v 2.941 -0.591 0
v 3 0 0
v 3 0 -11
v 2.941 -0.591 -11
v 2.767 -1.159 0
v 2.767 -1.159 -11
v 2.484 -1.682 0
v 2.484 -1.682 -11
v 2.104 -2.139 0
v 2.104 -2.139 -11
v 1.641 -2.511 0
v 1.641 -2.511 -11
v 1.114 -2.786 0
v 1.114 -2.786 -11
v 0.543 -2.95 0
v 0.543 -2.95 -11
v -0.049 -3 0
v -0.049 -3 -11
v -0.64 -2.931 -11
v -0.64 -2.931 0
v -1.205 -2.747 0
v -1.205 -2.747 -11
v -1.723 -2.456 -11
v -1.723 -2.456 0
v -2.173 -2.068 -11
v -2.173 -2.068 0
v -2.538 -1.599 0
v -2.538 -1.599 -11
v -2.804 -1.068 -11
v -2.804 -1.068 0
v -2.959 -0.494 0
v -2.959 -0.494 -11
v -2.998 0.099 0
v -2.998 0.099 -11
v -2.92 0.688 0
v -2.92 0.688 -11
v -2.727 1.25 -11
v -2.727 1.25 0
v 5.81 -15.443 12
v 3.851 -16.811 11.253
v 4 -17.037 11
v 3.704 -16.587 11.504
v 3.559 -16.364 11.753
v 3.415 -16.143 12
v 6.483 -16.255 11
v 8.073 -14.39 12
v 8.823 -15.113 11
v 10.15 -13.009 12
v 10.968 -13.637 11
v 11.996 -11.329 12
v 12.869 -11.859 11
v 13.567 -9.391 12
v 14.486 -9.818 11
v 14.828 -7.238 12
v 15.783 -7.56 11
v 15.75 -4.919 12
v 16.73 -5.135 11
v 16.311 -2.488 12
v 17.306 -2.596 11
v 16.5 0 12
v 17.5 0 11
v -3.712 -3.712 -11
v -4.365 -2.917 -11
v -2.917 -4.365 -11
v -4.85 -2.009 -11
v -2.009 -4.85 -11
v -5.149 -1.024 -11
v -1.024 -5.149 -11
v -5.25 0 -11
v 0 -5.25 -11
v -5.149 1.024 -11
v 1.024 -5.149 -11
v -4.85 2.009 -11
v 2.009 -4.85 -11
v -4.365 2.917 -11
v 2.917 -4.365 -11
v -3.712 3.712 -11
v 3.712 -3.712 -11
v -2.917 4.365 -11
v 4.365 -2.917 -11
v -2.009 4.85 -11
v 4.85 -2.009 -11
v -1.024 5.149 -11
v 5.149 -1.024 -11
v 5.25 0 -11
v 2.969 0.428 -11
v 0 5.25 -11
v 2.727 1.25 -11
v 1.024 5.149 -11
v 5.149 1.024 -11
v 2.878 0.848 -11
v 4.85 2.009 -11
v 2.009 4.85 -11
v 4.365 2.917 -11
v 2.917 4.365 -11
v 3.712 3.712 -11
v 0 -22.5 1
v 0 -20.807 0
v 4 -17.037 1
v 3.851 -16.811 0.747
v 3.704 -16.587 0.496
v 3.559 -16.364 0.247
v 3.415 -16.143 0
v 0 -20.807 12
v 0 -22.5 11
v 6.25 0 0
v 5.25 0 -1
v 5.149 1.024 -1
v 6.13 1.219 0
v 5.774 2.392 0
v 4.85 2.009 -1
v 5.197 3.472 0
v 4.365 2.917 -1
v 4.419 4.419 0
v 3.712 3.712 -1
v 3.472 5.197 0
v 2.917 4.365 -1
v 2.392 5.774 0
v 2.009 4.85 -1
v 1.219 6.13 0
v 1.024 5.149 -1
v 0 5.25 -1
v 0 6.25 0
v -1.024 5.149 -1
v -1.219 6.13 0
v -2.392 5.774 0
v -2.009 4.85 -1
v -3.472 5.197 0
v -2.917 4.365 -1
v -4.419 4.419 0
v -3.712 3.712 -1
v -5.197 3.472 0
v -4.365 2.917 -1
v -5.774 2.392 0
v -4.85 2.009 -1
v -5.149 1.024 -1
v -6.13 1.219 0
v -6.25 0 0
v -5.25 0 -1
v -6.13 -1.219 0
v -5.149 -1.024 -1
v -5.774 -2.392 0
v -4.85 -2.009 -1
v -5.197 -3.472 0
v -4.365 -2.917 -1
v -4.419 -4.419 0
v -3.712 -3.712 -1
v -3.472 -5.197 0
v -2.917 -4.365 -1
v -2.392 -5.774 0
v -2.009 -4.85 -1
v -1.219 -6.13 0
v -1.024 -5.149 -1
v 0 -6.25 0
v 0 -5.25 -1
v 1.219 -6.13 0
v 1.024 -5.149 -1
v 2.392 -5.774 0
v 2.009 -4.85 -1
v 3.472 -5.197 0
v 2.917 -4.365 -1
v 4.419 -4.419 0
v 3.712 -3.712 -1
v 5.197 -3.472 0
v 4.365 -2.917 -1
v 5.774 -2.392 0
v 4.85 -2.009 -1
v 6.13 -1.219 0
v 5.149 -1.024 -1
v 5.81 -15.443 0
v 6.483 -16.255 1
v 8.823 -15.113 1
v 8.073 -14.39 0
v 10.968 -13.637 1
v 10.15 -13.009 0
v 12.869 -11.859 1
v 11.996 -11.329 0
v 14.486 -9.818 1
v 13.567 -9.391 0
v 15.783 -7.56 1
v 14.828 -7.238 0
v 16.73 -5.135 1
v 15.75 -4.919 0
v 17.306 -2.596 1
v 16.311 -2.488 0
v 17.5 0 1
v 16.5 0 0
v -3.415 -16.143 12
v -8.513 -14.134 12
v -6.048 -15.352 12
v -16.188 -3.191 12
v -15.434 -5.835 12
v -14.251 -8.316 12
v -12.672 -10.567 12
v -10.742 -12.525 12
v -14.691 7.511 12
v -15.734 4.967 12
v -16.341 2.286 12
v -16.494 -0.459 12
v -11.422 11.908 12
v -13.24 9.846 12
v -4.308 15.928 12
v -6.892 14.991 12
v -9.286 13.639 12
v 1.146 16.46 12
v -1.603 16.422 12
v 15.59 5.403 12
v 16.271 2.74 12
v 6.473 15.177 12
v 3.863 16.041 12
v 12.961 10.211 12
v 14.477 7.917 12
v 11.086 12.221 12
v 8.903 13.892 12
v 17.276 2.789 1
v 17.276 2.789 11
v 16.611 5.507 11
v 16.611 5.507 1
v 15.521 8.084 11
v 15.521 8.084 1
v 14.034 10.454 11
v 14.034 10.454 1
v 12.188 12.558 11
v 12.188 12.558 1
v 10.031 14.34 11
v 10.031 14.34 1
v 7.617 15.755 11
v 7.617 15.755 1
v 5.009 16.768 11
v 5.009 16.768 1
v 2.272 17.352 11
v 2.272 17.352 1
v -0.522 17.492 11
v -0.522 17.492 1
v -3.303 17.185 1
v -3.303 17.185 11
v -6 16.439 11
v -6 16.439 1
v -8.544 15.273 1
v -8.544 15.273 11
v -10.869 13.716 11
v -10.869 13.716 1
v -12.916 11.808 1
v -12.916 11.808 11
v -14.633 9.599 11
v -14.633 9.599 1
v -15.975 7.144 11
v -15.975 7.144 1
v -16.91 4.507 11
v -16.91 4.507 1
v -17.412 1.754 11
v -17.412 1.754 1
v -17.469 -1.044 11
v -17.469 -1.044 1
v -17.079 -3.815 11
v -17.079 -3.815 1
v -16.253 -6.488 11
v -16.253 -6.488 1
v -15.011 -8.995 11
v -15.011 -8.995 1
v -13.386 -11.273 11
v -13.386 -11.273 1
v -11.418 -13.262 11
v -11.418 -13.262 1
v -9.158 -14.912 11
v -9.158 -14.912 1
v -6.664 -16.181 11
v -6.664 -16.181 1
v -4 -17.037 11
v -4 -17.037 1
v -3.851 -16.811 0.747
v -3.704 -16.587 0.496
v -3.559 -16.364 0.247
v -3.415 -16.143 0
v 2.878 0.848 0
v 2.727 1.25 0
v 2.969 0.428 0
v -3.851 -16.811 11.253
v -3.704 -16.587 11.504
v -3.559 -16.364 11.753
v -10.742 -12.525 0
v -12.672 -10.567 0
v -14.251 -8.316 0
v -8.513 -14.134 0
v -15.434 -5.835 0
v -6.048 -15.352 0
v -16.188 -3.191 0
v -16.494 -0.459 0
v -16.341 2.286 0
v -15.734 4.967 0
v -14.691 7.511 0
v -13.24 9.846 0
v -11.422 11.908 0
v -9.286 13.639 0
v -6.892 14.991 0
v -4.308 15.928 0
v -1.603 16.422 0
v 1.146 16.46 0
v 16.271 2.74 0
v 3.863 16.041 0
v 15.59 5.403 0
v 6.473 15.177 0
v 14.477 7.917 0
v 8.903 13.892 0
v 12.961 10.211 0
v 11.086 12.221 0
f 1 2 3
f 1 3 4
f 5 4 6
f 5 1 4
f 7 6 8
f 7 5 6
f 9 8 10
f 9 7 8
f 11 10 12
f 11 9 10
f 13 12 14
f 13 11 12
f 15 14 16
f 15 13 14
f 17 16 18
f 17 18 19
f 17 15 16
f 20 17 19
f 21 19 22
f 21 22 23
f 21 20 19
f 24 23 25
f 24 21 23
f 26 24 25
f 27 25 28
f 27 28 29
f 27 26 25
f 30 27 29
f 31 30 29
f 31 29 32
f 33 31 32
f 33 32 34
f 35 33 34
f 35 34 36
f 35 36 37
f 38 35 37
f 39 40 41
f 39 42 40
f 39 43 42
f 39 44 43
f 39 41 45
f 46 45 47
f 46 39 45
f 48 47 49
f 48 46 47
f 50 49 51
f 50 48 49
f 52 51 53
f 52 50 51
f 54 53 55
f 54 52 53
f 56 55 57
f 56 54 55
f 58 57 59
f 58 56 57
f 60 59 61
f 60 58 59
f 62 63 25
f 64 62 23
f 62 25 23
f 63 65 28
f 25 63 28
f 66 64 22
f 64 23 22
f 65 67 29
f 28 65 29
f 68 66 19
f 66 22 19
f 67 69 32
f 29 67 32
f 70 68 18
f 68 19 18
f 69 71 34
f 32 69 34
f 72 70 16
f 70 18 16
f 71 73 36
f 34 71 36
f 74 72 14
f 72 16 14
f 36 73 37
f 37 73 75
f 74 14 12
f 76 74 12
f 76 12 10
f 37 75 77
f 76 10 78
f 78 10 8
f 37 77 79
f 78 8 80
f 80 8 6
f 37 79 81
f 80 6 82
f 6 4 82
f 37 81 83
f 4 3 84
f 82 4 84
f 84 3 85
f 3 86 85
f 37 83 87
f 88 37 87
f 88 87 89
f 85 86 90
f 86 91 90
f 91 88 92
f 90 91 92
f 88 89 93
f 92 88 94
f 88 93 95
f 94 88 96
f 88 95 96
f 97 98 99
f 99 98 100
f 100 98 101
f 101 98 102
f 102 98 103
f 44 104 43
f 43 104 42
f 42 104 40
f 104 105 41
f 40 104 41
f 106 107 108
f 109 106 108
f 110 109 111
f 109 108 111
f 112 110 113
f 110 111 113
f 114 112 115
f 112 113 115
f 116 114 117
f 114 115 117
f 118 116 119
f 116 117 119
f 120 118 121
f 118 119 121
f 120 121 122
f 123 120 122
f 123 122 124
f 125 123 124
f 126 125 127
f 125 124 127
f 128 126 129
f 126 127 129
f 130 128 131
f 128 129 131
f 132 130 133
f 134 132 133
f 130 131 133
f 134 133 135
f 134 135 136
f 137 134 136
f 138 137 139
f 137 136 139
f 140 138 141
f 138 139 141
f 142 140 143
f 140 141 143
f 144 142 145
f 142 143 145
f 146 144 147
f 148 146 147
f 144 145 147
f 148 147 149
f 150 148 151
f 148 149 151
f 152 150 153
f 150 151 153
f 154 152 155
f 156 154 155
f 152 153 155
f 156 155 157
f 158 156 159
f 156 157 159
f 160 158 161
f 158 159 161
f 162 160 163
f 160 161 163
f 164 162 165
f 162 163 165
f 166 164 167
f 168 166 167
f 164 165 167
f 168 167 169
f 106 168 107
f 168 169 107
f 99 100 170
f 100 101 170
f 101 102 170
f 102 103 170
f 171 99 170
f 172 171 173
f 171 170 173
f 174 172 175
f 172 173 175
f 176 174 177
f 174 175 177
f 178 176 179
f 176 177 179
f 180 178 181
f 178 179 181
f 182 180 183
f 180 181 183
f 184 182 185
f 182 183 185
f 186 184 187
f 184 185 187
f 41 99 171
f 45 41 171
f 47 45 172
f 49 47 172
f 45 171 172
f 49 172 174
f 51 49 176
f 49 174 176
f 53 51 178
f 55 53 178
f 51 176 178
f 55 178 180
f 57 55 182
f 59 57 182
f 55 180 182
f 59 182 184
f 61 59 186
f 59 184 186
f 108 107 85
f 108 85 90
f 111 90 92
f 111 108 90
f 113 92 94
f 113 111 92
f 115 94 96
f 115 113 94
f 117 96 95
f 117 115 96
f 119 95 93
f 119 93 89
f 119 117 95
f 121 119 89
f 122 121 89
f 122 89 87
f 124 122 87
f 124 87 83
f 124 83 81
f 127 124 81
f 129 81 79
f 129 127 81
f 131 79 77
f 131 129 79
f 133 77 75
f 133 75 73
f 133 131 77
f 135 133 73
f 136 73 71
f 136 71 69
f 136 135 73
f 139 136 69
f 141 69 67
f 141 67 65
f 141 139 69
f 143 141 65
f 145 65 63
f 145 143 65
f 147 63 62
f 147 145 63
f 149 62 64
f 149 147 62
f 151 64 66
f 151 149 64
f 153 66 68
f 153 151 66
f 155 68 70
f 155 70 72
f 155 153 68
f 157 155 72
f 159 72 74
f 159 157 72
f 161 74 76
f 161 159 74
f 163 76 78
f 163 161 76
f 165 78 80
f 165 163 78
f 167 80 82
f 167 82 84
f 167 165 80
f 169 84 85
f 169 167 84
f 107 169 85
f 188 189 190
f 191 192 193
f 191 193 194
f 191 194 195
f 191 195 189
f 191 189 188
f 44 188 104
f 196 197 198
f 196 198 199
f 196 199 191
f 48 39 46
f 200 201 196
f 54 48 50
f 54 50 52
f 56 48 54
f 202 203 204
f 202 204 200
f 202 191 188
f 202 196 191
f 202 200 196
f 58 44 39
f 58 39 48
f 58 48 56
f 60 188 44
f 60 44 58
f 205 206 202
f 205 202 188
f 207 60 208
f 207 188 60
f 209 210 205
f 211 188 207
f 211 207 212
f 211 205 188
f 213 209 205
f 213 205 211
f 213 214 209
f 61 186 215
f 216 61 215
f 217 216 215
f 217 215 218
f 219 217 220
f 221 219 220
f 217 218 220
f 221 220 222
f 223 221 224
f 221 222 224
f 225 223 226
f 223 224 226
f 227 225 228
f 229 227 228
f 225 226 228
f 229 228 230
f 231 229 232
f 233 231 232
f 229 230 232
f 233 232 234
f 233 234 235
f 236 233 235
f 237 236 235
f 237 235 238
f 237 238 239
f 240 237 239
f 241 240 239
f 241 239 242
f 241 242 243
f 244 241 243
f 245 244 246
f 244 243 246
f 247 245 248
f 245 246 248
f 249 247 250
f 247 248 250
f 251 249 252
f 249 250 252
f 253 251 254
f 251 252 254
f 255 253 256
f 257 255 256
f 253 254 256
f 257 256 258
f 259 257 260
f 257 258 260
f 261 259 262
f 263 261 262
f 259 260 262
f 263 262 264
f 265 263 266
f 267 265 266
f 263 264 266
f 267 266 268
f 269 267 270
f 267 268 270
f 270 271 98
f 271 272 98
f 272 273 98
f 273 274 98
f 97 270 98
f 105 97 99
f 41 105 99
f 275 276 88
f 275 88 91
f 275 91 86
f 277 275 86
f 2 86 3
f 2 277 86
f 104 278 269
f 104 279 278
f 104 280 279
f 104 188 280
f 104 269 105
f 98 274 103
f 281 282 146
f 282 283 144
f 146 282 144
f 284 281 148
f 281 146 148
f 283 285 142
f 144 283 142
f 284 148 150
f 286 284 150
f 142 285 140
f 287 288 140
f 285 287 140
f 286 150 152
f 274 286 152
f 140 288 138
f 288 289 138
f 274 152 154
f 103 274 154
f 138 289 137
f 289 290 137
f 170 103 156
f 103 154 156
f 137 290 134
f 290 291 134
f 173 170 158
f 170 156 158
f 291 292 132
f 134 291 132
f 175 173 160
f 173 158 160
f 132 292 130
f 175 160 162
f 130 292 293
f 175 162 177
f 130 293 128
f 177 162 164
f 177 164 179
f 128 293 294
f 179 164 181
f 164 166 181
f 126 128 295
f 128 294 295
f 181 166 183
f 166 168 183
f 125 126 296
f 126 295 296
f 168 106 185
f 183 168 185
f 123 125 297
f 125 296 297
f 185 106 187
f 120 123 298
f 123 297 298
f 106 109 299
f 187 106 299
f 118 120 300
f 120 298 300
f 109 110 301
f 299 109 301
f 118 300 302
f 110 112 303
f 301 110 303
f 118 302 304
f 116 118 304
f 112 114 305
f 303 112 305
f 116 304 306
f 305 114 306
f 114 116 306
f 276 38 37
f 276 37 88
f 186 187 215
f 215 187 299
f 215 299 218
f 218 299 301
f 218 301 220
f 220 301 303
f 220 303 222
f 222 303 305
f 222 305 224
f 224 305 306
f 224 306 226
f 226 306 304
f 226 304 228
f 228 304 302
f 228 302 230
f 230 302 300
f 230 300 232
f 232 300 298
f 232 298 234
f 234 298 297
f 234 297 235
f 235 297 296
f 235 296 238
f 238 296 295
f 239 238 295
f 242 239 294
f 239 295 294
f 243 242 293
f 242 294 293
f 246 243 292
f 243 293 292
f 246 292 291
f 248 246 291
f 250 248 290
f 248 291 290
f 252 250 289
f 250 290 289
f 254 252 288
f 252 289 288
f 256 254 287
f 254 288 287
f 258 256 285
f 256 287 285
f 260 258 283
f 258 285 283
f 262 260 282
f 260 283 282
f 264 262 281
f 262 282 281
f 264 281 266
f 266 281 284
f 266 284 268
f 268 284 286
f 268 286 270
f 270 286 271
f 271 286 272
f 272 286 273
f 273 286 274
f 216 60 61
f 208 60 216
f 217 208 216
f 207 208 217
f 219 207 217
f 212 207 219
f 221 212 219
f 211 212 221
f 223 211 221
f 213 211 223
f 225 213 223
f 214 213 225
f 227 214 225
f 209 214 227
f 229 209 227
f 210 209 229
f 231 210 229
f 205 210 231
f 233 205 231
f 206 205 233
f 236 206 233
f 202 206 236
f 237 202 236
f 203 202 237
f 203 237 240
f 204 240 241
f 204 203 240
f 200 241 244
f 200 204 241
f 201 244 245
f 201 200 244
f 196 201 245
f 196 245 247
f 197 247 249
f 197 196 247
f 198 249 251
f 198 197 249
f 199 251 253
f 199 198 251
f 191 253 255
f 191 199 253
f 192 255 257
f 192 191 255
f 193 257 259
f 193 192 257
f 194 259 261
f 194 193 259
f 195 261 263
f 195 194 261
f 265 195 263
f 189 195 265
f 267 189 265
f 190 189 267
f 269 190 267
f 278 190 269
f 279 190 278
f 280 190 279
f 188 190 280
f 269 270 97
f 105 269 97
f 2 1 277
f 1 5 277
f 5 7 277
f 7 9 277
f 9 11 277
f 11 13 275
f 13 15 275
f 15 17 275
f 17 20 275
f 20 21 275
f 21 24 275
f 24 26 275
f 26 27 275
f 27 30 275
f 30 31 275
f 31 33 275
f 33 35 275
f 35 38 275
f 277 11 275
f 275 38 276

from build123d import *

# Parameters (mm, degrees)
F0_R     = 5.25
F1_DEPTH = 12
F2_DEPTH = 11
F3_DEPTH = 12
F4_SIZE  = 1
F5_SIZE  = 1


with BuildPart() as f1:
    # F0 (on Top) → F1 (new body)
    with BuildSketch(Plane.XY):
        with BuildLine():
            ThreePointArc((4, -17.036725), (13.715867, -10.868533), (17.5, 0))
            ThreePointArc((17.5, 0), (-10.868533, 13.715867), (-4, -17.036725))
            ThreePointArc((-4, -17.036725), (0, -17.5), (4, -17.036725))
        make_face()
        Circle(F0_R, mode=Mode.SUBTRACT)
        Circle(F0_R)
        with BuildLine():
            ThreePointArc((2.727178, 1.25), (2.931001, 0.639713), (3, 0))
            ThreePointArc((3, 0), (-0.639713, -2.931001), (-2.727178, 1.25))
            ThreePointArc((-2.727178, 1.25), (0, 3), (2.727178, 1.25))
        make_face(mode=Mode.SUBTRACT)
        with BuildLine():
            ThreePointArc((-2.727178, 1.25), (-0.639713, -2.931001), (3, 0))
            ThreePointArc((3, 0), (2.931001, 0.639713), (2.727178, 1.25))
            Line((2.727178, 1.25), (-2.727178, 1.25))
        make_face()
        with BuildLine():
            Line((-2.727178, 1.25), (2.727178, 1.25))
            ThreePointArc((2.727178, 1.25), (0, 3), (-2.727178, 1.25))
        make_face()
    extrude(amount=F1_DEPTH)

    # F0 (on Top) → F2 (join)
    with BuildSketch(Plane.XY):
        Circle(F0_R)
        with BuildLine():
            ThreePointArc((2.727178, 1.25), (2.931001, 0.639713), (3, 0))
            ThreePointArc((3, 0), (-0.639713, -2.931001), (-2.727178, 1.25))
            ThreePointArc((-2.727178, 1.25), (0, 3), (2.727178, 1.25))
        make_face(mode=Mode.SUBTRACT)
        with BuildLine():
            Line((-2.727178, 1.25), (2.727178, 1.25))
            ThreePointArc((2.727178, 1.25), (0, 3), (-2.727178, 1.25))
        make_face()
    extrude(amount=-F2_DEPTH)

    # F0 (on Top) → F3 (join)
    with BuildSketch(Plane.XY):
        with BuildLine():
            ThreePointArc((4, -17.036725), (0, -17.5), (-4, -17.036725))
            Line((-4, -17.036725), (0, -22.5))
            Line((0, -22.5), (4, -17.036725))
        make_face()
    extrude(amount=F3_DEPTH)

    # F4
    f4_edges = [f1.edges().sort_by_distance(p)[0] for p in [
        (0, 17.5, 0),
        (-2, -19.768363, 0),
        (2, -19.768363, 0),
        (-5.25, 0, 0),
    ]]
    chamfer(f4_edges, length=F4_SIZE)

    # F5
    f5_edges = [f1.edges().sort_by_distance(p)[0] for p in [
        (0, 17.5, 12),
        (-2, -19.768363, 12),
        (2, -19.768363, 12),
    ]]
    chamfer(f5_edges, length=F5_SIZE)


solid = f1.part
